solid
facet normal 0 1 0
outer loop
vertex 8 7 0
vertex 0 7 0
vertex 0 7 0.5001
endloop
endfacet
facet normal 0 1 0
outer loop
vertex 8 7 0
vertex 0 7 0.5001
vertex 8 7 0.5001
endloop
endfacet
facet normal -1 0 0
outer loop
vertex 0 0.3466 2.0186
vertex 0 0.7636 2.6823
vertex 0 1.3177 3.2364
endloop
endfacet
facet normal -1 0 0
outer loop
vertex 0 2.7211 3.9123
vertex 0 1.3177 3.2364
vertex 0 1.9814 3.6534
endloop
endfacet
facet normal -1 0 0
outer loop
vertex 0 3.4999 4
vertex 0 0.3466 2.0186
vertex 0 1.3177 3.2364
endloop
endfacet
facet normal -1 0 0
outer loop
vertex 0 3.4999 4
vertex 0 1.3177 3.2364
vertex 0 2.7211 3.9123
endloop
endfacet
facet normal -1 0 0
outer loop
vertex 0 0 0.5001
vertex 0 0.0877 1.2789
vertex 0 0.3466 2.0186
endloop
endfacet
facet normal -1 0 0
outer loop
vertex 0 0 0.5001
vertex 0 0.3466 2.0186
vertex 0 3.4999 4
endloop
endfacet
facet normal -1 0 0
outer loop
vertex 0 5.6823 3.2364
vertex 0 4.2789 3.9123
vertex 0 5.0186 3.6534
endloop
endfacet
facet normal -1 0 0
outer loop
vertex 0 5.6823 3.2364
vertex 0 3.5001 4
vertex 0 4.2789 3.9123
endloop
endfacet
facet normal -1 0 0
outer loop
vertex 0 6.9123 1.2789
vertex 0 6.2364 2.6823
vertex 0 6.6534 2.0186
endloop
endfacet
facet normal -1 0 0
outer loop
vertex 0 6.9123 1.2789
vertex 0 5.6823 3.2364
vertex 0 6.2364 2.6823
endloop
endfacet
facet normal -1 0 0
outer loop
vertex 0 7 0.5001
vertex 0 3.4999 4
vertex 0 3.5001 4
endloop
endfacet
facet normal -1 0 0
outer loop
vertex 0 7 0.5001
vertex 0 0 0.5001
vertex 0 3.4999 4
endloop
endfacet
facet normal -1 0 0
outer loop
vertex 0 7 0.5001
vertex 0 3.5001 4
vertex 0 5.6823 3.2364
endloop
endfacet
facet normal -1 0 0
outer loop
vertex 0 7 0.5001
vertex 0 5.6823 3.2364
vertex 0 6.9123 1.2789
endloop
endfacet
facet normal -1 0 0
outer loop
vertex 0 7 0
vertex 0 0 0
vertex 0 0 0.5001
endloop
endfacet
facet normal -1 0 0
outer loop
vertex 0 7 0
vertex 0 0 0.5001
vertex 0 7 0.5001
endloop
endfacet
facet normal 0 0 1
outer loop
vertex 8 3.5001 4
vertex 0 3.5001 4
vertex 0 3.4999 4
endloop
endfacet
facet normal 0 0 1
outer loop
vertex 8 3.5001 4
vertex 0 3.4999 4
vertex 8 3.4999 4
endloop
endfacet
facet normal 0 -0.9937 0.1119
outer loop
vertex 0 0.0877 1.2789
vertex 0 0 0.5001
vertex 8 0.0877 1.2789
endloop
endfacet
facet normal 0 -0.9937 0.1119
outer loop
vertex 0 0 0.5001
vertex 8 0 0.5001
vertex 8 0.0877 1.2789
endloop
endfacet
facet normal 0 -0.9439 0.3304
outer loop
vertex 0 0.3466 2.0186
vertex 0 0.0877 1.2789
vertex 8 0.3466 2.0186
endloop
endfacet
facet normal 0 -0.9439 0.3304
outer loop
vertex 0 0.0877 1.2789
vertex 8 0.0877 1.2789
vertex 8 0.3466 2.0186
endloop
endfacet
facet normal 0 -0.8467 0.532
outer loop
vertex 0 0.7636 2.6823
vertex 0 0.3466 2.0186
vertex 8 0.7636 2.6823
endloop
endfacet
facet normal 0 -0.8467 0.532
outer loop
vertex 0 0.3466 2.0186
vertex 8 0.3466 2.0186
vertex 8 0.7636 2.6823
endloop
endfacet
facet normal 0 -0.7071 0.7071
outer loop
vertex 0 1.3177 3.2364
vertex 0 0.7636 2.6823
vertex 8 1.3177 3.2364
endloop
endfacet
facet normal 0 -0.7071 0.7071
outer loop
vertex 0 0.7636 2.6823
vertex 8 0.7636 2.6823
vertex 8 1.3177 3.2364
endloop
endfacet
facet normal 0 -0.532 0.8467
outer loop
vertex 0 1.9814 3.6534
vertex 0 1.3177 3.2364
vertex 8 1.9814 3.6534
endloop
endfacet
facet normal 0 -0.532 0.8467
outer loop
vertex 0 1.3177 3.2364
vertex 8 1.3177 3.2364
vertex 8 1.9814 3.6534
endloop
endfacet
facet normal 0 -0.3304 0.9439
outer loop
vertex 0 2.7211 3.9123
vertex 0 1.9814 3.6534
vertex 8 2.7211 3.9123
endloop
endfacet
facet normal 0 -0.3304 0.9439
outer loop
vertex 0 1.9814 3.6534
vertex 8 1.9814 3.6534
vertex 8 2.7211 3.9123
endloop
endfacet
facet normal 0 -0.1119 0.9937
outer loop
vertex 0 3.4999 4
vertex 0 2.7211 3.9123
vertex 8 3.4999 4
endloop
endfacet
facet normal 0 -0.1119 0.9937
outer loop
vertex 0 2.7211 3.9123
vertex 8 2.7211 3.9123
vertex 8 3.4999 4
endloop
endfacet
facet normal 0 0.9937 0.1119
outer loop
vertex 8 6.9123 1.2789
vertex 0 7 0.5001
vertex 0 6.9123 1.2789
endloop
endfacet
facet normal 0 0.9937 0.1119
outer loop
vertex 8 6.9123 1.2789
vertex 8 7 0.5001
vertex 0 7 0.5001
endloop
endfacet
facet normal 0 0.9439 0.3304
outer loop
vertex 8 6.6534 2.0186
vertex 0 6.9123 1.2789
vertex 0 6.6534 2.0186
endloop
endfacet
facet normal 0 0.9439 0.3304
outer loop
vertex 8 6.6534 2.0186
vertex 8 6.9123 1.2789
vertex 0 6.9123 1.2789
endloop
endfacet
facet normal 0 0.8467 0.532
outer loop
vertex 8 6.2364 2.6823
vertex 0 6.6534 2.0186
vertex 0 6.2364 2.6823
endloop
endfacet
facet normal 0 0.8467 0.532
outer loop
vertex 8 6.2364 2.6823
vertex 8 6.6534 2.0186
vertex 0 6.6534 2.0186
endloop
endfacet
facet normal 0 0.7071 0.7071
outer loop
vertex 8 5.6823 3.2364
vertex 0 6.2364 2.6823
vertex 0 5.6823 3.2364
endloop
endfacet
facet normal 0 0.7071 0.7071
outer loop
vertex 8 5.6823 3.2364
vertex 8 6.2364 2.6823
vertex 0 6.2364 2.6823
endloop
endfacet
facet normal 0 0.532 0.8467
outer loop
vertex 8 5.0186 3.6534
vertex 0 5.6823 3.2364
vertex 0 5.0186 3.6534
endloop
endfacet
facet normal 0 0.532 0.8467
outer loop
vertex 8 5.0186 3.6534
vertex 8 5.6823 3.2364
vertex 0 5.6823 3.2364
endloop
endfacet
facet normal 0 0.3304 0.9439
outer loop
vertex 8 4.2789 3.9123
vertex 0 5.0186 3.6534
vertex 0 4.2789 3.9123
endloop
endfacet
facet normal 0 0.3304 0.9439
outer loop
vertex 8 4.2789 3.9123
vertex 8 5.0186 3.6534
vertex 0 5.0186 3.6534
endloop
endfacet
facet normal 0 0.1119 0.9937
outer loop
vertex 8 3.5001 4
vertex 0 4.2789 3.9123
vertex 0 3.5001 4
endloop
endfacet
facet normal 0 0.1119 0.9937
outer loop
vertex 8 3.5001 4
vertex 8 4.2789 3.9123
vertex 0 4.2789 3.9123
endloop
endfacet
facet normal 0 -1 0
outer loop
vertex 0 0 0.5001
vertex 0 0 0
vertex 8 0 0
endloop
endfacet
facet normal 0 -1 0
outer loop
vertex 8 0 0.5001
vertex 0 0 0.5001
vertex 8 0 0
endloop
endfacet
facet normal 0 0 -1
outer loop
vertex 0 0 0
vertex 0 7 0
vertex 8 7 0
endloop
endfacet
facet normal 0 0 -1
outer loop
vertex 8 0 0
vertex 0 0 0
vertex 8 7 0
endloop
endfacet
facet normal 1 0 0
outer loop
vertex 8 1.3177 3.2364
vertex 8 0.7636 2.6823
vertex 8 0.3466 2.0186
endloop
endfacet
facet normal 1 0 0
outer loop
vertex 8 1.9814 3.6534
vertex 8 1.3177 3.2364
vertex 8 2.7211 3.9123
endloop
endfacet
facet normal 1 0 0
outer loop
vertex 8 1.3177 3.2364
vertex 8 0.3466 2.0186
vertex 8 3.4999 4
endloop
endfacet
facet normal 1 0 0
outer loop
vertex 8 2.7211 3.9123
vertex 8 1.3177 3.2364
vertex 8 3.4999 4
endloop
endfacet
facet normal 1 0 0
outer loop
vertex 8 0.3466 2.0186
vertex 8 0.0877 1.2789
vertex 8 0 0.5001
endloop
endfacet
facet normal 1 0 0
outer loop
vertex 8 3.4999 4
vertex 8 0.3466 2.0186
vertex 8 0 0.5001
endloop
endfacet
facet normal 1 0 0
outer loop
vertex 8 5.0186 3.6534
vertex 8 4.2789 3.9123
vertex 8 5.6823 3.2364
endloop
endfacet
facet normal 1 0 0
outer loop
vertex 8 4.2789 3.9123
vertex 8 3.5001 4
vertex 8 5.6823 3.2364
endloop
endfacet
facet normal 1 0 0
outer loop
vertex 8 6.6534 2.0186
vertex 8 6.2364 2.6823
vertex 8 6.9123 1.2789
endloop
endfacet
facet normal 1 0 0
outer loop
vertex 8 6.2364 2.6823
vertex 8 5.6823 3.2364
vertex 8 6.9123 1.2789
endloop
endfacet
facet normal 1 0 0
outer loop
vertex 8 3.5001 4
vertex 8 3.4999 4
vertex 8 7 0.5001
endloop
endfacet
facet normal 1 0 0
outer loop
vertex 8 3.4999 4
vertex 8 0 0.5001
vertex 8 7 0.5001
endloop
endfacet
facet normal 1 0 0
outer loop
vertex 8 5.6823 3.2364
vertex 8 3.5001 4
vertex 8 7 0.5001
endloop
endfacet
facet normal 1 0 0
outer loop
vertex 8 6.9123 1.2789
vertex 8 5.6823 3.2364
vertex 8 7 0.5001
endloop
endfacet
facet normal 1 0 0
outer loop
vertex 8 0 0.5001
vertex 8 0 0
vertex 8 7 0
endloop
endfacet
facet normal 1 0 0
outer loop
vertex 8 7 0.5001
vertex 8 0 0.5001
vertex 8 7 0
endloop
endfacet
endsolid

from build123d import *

# Parameters (mm, degrees)
SKETCH1_W           = 8
SKETCH1_H           = 7
BOSS_EXTRUDE1_DEPTH = 4
FILLET1_R           = 3.5


with BuildPart() as part:
    # Sketch1 → Boss-Extrude1 (new body)
    with BuildSketch(Plane.XY):
        with Locations((4, 3.5)):
            Rectangle(SKETCH1_W, SKETCH1_H)
    extrude(amount=BOSS_EXTRUDE1_DEPTH)

    # Fillet1
    fillet1_edges = [part.edges().sort_by_distance(p)[0] for p in [
        (4, 0, 4),
        (4, 7, 4),
    ]]
    fillet(fillet1_edges, radius=FILLET1_R - 0.0001)  # a hair under: the kernel refuses the full size


solid = part.part
